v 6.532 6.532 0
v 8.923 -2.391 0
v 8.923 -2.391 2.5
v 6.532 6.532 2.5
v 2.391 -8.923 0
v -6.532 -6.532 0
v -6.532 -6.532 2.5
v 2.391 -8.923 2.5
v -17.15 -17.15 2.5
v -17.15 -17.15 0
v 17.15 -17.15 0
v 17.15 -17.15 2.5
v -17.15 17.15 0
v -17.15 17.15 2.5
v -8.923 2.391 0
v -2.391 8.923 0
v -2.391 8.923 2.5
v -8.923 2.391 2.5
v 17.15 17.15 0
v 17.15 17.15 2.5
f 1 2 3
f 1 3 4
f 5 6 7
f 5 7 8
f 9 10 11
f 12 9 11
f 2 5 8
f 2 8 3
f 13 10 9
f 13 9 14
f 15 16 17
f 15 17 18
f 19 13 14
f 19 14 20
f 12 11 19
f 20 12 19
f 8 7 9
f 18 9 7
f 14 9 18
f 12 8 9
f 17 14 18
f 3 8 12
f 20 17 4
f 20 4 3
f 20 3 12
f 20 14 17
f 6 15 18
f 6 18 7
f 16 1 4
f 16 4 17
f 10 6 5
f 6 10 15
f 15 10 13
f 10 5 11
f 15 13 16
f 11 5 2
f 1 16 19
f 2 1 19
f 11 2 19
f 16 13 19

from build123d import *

# Parameters (mm, degrees)
SKETCH_1_W      = 34.3
SKETCH_1_H      = 34.3
EXTRUDE_1_DEPTH = 2.5


with BuildPart() as part:
    # 草图1 → 凸台-拉伸1 (new body)
    with BuildSketch(Plane.XY):
        Rectangle(SKETCH_1_W, SKETCH_1_H)
        Polygon((6.531972647, 6.531972647), (-2.390867926, 8.922840573), (-8.922840573, 2.390867926), (-6.531972647, -6.531972647), (2.390867926, -8.922840573), (8.922840573, -2.390867926), align=None, mode=Mode.SUBTRACT)
    extrude(amount=EXTRUDE_1_DEPTH)


solid = part.part
